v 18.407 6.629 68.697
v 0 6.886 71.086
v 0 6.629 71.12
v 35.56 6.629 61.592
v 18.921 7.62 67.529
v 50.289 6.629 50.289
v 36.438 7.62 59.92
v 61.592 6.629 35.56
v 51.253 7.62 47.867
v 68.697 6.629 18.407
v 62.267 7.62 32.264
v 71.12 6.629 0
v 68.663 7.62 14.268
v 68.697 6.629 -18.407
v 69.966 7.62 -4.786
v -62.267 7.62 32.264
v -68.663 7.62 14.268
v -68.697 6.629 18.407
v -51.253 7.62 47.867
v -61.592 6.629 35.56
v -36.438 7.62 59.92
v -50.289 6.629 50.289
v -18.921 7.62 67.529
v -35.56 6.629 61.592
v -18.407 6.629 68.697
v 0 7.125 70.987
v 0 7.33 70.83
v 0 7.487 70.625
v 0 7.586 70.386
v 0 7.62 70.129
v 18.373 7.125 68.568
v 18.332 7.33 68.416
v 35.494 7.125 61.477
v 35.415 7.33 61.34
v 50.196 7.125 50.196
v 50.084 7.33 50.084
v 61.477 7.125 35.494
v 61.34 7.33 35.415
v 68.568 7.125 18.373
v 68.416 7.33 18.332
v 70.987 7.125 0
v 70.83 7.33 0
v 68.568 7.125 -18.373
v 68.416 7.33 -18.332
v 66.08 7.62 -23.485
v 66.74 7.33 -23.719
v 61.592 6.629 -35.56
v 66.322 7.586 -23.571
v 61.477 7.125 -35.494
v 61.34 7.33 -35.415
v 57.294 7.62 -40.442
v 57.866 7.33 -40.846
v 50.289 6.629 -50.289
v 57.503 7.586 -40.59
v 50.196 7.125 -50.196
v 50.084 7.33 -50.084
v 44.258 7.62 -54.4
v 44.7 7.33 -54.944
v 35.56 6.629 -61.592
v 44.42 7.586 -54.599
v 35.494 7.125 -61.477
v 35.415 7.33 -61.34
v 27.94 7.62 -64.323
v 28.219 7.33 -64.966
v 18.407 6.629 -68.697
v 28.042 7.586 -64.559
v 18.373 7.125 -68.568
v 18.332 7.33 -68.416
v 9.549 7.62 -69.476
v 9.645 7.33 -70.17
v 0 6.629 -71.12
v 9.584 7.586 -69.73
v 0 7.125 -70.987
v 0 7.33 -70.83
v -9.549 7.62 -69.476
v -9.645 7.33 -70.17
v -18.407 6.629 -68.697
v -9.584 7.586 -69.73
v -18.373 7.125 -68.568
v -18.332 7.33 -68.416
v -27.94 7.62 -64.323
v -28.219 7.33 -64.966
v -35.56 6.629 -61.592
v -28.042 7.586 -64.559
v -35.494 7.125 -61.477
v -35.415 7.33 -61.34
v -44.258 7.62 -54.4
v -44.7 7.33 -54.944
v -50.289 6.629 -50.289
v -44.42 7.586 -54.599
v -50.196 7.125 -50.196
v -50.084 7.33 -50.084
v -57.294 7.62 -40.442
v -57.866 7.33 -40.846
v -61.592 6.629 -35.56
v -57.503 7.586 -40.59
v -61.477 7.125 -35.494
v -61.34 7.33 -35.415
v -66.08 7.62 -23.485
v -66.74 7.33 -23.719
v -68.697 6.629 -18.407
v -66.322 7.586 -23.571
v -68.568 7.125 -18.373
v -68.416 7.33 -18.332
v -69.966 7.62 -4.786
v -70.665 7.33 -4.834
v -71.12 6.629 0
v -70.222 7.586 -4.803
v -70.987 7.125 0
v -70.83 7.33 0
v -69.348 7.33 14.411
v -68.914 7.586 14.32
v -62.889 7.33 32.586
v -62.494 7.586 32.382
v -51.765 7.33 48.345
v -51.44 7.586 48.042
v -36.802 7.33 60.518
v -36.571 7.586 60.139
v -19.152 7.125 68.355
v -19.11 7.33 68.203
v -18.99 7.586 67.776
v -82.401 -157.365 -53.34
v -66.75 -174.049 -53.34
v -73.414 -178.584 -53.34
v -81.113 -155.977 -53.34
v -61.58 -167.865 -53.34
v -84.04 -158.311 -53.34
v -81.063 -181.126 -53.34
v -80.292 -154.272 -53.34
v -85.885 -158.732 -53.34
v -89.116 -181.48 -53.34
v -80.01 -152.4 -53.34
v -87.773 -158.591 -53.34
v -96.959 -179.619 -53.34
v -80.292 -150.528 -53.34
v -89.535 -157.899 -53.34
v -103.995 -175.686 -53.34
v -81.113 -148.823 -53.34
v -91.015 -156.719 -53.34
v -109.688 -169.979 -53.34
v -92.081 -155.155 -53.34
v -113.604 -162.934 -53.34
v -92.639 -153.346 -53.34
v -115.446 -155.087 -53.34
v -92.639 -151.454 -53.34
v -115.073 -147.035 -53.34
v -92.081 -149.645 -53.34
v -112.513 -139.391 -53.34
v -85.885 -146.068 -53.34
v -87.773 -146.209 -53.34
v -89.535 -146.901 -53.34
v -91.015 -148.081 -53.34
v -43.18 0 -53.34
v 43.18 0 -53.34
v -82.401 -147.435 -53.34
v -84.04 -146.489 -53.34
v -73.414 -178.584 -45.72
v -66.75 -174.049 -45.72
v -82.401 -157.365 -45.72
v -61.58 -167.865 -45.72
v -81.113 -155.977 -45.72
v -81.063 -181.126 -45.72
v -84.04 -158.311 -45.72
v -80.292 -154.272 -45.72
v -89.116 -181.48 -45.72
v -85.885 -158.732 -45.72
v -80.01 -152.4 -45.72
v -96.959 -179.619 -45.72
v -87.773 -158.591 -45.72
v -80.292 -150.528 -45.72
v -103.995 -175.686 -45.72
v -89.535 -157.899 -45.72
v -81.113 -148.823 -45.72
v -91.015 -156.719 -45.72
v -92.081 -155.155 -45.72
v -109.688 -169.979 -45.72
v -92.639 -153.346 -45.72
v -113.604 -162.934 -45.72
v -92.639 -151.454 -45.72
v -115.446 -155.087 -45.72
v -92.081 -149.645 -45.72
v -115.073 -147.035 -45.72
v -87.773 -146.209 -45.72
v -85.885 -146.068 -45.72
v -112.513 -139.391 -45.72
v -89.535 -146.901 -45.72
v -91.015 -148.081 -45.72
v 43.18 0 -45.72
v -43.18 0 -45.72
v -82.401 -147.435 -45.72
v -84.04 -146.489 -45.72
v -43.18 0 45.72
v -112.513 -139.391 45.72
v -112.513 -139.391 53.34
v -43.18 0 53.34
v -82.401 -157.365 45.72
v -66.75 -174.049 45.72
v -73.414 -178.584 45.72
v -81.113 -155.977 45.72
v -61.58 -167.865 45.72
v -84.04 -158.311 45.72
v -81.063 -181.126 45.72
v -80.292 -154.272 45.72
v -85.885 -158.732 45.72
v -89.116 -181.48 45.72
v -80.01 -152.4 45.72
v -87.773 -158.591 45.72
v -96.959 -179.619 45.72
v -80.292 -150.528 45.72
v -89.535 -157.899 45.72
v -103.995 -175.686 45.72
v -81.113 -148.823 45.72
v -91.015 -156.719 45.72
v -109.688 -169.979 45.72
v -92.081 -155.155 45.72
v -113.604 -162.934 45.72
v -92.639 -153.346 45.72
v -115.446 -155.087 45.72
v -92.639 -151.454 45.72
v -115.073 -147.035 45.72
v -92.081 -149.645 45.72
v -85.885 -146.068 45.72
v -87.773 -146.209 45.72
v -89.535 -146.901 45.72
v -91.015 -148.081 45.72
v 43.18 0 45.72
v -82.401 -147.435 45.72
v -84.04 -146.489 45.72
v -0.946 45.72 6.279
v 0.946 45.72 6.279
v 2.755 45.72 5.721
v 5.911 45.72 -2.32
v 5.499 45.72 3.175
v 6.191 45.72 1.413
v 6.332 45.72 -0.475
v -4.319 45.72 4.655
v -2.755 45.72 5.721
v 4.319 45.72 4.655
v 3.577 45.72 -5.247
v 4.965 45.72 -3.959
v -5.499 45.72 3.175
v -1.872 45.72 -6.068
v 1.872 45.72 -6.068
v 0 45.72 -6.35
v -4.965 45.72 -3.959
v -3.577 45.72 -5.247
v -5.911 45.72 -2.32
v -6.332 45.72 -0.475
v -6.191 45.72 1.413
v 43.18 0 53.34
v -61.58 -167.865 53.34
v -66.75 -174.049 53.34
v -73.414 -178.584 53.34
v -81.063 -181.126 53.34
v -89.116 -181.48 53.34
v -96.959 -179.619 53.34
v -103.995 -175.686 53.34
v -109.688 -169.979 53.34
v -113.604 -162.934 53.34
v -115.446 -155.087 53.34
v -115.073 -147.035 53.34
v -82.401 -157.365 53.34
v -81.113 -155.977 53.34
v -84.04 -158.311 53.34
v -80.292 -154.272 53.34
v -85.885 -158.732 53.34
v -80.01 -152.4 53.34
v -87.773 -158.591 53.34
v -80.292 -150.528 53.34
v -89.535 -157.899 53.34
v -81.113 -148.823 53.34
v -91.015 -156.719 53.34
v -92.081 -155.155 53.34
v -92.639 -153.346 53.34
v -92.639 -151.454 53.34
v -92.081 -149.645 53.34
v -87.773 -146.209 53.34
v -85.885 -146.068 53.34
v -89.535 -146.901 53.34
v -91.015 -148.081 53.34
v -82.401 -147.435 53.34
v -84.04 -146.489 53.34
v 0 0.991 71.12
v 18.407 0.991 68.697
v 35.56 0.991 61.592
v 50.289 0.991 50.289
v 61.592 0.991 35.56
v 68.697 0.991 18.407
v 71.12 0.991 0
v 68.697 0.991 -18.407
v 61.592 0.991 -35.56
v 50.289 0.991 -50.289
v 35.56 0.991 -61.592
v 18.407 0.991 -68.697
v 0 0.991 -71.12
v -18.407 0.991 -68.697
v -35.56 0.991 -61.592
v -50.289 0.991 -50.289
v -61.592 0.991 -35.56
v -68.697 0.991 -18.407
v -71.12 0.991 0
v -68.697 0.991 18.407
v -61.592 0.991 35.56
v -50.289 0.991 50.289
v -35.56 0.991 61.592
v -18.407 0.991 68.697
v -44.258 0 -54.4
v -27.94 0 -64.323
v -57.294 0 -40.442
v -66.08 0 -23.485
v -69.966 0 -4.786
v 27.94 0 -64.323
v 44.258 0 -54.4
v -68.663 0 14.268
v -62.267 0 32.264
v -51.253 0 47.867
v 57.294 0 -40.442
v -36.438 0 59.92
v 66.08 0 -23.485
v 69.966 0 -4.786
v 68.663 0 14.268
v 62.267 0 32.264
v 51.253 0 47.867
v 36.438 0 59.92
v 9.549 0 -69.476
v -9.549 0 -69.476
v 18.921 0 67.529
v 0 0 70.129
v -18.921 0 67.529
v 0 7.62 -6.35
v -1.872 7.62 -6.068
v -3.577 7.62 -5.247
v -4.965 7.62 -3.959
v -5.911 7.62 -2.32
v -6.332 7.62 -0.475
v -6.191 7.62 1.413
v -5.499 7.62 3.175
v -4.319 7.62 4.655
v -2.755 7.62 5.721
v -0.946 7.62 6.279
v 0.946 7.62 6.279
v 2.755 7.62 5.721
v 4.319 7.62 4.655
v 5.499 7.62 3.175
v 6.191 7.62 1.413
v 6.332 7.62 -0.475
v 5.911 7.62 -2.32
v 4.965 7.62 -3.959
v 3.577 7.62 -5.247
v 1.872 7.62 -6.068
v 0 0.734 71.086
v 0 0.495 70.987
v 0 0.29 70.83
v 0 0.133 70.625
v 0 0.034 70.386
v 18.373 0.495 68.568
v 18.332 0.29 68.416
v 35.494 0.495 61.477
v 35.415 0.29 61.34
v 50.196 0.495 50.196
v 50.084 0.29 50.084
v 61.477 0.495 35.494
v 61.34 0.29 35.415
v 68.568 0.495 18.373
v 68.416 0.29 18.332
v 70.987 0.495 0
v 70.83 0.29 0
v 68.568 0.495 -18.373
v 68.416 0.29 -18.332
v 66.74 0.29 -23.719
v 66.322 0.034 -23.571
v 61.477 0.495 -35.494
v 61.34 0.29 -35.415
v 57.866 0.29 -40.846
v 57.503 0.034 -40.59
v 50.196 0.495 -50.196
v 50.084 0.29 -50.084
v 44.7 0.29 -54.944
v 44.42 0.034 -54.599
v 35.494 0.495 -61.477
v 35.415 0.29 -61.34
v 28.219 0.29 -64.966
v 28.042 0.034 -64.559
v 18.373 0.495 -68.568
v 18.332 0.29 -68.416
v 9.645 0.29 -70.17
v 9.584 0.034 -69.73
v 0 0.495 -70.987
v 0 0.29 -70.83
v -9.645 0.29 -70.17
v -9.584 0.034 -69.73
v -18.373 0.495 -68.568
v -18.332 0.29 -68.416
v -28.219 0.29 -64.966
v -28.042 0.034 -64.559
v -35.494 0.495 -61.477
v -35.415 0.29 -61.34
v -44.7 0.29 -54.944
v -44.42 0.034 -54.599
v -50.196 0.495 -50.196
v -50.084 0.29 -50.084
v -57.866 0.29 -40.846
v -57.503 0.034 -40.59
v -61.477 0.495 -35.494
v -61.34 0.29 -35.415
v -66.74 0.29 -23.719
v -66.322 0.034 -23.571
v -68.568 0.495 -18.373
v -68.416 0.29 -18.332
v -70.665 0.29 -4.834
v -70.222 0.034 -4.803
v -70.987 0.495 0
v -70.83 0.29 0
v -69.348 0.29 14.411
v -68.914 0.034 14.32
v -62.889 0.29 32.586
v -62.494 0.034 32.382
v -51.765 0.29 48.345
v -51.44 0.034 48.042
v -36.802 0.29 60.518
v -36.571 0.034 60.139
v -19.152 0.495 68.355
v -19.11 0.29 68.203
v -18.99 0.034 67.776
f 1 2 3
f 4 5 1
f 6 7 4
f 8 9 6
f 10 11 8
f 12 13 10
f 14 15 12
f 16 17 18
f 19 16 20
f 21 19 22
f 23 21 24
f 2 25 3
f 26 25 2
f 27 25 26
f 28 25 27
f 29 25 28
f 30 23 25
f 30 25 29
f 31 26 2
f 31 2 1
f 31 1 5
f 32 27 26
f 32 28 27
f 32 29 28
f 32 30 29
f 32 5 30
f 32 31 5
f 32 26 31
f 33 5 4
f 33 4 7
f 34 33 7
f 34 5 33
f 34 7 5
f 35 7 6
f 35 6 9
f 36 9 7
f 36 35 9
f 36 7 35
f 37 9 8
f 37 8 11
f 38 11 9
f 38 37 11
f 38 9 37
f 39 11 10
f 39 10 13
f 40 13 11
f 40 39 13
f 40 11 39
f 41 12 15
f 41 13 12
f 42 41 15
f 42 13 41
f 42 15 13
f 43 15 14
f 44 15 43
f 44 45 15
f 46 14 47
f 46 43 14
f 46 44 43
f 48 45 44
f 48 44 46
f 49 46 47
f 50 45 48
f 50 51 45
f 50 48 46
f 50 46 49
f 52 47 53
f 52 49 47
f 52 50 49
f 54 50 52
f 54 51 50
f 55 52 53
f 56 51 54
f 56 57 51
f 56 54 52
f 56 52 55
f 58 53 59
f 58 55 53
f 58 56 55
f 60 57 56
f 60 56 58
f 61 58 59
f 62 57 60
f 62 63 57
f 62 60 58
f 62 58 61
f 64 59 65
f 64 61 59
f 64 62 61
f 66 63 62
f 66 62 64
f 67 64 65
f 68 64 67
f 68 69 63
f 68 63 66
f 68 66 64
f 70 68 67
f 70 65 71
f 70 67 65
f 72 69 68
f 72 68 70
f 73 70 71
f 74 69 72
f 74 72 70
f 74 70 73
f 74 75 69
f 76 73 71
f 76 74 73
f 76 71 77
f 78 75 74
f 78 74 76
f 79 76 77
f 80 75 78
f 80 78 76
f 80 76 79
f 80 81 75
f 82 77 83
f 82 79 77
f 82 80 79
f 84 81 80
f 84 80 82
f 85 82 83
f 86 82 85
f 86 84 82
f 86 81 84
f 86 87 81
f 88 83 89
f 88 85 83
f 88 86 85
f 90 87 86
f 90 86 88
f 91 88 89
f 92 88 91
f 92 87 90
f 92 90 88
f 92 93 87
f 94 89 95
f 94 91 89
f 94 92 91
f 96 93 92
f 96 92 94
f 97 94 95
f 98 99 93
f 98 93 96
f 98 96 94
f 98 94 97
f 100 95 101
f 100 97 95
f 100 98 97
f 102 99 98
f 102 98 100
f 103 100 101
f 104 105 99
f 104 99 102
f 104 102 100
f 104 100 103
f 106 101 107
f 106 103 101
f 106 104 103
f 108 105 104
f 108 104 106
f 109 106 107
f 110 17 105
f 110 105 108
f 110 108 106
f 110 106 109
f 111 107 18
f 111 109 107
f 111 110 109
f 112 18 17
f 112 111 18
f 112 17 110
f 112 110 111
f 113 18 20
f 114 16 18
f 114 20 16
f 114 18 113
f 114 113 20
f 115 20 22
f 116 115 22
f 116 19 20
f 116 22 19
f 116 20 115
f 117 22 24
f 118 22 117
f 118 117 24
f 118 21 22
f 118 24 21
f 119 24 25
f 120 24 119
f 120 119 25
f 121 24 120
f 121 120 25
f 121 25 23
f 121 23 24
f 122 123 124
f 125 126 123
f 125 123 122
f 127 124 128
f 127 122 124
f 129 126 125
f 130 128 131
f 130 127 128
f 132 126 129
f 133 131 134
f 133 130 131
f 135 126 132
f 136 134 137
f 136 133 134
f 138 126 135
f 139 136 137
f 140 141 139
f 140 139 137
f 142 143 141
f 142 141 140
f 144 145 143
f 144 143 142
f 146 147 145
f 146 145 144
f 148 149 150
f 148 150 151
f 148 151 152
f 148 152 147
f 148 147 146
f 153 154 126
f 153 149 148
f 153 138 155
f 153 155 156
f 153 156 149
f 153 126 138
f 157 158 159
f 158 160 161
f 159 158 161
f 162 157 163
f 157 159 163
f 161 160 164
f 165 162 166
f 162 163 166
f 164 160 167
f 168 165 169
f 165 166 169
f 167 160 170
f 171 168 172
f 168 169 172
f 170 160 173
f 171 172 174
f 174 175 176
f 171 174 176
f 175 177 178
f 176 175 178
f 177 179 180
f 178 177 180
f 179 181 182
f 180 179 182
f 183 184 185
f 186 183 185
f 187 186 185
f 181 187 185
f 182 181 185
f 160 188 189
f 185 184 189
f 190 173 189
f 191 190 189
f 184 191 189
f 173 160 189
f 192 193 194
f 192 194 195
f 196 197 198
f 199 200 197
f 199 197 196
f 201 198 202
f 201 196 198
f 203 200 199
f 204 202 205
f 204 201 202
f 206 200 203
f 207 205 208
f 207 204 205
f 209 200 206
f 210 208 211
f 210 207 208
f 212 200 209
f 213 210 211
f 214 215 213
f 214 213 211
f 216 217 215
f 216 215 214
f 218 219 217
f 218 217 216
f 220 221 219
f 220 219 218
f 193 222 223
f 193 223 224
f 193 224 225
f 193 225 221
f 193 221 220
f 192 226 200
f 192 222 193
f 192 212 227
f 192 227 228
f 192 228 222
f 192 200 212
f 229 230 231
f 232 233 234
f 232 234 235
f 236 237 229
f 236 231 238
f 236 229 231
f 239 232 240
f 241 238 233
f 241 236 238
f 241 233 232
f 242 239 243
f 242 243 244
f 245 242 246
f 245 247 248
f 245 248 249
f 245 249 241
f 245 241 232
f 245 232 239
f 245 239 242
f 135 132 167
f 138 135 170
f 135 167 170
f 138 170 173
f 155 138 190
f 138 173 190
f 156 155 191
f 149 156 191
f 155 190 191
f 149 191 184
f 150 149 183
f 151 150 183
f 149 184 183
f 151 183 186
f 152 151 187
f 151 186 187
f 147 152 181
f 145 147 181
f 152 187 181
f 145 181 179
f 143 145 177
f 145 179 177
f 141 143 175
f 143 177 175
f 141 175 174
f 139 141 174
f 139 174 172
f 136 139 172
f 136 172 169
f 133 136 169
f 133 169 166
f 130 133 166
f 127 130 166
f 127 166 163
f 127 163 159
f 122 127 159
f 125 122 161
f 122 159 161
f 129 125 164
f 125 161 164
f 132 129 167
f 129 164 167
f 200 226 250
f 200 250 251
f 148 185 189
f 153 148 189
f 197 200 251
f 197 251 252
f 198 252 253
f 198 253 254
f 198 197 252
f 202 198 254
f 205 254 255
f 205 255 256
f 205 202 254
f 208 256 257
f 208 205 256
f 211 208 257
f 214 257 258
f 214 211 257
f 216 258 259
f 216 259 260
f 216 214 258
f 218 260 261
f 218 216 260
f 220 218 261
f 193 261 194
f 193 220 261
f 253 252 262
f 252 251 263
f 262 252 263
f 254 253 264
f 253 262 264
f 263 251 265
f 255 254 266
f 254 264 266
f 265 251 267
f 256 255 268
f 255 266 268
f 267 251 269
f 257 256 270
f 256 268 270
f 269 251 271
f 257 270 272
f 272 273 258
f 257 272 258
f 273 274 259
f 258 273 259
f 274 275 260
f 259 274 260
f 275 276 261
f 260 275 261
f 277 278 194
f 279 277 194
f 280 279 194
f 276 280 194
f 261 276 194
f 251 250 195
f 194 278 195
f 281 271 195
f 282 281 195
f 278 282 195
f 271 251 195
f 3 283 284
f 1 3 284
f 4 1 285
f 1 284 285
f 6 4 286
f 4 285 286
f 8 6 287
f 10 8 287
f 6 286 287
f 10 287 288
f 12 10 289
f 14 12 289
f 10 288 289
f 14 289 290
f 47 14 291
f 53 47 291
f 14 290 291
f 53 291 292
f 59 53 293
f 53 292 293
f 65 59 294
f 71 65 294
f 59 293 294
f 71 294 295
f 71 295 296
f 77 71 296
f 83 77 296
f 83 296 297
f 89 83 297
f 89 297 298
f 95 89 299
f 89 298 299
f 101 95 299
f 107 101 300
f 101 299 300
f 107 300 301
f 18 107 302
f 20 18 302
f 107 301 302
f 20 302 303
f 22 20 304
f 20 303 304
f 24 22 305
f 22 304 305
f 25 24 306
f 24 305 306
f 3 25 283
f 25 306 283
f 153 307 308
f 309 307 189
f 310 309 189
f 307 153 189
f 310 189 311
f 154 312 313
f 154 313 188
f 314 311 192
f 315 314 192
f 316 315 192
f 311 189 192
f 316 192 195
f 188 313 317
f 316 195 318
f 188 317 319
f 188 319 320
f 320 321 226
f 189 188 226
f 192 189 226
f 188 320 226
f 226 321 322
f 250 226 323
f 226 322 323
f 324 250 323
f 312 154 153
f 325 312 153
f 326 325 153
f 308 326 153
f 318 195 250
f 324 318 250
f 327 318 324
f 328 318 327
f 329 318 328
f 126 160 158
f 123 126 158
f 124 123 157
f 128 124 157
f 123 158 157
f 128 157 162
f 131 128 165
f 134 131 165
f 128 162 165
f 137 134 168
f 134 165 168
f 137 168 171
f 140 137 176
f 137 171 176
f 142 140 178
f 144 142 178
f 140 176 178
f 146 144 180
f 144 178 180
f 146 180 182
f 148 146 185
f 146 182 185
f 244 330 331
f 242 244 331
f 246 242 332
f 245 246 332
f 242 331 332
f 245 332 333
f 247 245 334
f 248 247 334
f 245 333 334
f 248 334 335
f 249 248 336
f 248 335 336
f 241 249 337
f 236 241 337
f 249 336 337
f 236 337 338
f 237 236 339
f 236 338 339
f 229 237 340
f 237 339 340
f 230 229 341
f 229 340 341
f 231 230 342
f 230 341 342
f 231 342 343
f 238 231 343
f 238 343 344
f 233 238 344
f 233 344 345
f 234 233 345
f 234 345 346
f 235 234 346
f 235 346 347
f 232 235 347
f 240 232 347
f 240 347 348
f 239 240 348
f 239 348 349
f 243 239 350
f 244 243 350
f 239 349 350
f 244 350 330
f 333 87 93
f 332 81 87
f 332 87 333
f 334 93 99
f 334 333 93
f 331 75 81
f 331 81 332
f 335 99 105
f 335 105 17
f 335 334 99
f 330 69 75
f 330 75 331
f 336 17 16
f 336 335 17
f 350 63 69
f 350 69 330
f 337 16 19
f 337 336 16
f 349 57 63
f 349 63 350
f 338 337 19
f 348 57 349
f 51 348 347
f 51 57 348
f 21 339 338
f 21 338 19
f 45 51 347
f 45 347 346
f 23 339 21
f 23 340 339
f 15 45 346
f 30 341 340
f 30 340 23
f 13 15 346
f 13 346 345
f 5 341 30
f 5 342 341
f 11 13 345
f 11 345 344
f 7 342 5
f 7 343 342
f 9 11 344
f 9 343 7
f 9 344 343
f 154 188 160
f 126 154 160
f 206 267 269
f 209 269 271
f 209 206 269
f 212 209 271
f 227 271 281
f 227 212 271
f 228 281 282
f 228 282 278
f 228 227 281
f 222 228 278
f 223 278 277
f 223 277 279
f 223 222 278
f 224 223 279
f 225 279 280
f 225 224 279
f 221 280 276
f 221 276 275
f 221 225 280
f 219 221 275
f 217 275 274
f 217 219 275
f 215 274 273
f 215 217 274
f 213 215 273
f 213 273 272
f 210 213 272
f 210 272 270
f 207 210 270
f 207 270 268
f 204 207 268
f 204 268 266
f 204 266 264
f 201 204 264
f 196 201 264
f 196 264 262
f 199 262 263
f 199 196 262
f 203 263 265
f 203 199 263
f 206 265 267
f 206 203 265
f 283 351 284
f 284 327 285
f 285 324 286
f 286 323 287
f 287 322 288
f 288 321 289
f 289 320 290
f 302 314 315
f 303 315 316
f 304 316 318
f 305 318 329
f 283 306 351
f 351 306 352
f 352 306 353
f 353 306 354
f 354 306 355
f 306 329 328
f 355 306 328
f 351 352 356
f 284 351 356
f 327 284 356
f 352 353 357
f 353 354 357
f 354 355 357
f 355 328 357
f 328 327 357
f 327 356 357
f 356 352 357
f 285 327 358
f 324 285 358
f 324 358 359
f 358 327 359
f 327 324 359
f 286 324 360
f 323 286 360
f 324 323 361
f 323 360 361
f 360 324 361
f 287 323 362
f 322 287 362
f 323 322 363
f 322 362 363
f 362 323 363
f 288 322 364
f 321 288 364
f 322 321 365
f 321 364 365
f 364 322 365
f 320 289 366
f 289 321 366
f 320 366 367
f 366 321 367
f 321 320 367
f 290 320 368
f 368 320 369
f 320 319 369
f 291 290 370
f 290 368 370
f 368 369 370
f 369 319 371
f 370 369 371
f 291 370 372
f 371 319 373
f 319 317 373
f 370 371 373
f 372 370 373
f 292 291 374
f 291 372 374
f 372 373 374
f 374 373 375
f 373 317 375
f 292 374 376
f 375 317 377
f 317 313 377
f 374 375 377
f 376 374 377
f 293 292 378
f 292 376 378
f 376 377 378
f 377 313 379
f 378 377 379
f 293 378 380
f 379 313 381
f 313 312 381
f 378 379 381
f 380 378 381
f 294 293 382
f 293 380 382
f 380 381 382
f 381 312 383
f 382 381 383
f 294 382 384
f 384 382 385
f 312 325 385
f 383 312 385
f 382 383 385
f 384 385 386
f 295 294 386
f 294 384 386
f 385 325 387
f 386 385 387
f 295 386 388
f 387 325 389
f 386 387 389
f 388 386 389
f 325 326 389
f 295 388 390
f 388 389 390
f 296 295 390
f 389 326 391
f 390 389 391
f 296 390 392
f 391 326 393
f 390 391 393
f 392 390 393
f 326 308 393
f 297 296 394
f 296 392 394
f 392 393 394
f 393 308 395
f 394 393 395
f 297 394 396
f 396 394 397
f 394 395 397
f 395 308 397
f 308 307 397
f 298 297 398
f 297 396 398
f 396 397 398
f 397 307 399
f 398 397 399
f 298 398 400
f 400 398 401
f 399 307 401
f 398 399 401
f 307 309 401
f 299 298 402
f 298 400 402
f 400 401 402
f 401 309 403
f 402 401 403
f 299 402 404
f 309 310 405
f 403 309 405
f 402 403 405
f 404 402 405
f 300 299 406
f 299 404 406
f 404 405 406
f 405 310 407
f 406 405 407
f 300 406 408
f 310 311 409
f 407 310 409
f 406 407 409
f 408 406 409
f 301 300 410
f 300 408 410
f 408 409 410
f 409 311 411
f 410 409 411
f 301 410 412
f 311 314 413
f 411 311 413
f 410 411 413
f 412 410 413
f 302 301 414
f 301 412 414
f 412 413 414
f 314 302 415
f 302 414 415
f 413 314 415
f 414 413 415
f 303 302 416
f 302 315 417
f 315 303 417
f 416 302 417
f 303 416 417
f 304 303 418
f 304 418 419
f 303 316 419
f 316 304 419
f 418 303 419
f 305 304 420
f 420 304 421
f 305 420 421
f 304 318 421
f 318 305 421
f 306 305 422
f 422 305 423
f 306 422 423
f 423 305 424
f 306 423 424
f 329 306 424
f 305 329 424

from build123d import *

# Parameters (mm, degrees)
SKETCH1_R           = 71.12
BOSS_EXTRUDE1_DEPTH = 7.62
FILLET1_R           = 0.9906
SKETCH3_R           = 6.35
BOSS_EXTRUDE2_DEPTH = 7.62
SKETCH5_R           = 6.35
BOSS_EXTRUDE3_DEPTH = 38.1


with BuildPart() as part:
    # Sketch1 → Boss-Extrude1 (new body)
    with BuildSketch(Plane(origin=(0, 0, 0), x_dir=(1, 0, 0), z_dir=(0, 1, 0))):
        with Locations(Location((0, 0, 0), (0, 0, 270))):
            Circle(SKETCH1_R)
    extrude(amount=BOSS_EXTRUDE1_DEPTH)

    # Fillet1
    fillet1_edges = [part.edges().sort_by_distance(p)[0] for p in [
        (0, 0, -71.12),
        (0, 7.62, -71.12),
    ]]
    fillet(fillet1_edges, radius=FILLET1_R)

    # Sketch3 → Boss-Extrude2 (add)
    with BuildSketch(Plane.XY.offset(45.72)):
        with BuildLine():
            Line((0, 0), (43.18, 0))
            Line((43.18, 0), (-61.579637217, -167.864725032))
            ThreePointArc((-61.579637217, -167.864725032), (-100.613254195, -177.896447691), (-112.513352174, -139.391300217))
            Line((-112.513352174, -139.391300217), (-43.18, 0))
            Line((-43.18, 0), (0, 0))
        make_face()
        with Locations((-86.36, -152.4)):
            Circle(SKETCH3_R, mode=Mode.SUBTRACT)
    boss_extrude2 = extrude(amount=BOSS_EXTRUDE2_DEPTH)

    # Mirror1: Boss-Extrude2 across plane
    add(boss_extrude2.mirror(Plane.XY))

    # Sketch5 → Boss-Extrude3 (add)
    with BuildSketch(Plane(origin=(0, 7.62, 0), x_dir=(1, 0, 0), z_dir=(0, 1, 0))):
        with Locations(Location((0, 0, 0), (0, 0, 90))):
            Circle(SKETCH5_R)
    extrude(amount=BOSS_EXTRUDE3_DEPTH)


solid = part.part
